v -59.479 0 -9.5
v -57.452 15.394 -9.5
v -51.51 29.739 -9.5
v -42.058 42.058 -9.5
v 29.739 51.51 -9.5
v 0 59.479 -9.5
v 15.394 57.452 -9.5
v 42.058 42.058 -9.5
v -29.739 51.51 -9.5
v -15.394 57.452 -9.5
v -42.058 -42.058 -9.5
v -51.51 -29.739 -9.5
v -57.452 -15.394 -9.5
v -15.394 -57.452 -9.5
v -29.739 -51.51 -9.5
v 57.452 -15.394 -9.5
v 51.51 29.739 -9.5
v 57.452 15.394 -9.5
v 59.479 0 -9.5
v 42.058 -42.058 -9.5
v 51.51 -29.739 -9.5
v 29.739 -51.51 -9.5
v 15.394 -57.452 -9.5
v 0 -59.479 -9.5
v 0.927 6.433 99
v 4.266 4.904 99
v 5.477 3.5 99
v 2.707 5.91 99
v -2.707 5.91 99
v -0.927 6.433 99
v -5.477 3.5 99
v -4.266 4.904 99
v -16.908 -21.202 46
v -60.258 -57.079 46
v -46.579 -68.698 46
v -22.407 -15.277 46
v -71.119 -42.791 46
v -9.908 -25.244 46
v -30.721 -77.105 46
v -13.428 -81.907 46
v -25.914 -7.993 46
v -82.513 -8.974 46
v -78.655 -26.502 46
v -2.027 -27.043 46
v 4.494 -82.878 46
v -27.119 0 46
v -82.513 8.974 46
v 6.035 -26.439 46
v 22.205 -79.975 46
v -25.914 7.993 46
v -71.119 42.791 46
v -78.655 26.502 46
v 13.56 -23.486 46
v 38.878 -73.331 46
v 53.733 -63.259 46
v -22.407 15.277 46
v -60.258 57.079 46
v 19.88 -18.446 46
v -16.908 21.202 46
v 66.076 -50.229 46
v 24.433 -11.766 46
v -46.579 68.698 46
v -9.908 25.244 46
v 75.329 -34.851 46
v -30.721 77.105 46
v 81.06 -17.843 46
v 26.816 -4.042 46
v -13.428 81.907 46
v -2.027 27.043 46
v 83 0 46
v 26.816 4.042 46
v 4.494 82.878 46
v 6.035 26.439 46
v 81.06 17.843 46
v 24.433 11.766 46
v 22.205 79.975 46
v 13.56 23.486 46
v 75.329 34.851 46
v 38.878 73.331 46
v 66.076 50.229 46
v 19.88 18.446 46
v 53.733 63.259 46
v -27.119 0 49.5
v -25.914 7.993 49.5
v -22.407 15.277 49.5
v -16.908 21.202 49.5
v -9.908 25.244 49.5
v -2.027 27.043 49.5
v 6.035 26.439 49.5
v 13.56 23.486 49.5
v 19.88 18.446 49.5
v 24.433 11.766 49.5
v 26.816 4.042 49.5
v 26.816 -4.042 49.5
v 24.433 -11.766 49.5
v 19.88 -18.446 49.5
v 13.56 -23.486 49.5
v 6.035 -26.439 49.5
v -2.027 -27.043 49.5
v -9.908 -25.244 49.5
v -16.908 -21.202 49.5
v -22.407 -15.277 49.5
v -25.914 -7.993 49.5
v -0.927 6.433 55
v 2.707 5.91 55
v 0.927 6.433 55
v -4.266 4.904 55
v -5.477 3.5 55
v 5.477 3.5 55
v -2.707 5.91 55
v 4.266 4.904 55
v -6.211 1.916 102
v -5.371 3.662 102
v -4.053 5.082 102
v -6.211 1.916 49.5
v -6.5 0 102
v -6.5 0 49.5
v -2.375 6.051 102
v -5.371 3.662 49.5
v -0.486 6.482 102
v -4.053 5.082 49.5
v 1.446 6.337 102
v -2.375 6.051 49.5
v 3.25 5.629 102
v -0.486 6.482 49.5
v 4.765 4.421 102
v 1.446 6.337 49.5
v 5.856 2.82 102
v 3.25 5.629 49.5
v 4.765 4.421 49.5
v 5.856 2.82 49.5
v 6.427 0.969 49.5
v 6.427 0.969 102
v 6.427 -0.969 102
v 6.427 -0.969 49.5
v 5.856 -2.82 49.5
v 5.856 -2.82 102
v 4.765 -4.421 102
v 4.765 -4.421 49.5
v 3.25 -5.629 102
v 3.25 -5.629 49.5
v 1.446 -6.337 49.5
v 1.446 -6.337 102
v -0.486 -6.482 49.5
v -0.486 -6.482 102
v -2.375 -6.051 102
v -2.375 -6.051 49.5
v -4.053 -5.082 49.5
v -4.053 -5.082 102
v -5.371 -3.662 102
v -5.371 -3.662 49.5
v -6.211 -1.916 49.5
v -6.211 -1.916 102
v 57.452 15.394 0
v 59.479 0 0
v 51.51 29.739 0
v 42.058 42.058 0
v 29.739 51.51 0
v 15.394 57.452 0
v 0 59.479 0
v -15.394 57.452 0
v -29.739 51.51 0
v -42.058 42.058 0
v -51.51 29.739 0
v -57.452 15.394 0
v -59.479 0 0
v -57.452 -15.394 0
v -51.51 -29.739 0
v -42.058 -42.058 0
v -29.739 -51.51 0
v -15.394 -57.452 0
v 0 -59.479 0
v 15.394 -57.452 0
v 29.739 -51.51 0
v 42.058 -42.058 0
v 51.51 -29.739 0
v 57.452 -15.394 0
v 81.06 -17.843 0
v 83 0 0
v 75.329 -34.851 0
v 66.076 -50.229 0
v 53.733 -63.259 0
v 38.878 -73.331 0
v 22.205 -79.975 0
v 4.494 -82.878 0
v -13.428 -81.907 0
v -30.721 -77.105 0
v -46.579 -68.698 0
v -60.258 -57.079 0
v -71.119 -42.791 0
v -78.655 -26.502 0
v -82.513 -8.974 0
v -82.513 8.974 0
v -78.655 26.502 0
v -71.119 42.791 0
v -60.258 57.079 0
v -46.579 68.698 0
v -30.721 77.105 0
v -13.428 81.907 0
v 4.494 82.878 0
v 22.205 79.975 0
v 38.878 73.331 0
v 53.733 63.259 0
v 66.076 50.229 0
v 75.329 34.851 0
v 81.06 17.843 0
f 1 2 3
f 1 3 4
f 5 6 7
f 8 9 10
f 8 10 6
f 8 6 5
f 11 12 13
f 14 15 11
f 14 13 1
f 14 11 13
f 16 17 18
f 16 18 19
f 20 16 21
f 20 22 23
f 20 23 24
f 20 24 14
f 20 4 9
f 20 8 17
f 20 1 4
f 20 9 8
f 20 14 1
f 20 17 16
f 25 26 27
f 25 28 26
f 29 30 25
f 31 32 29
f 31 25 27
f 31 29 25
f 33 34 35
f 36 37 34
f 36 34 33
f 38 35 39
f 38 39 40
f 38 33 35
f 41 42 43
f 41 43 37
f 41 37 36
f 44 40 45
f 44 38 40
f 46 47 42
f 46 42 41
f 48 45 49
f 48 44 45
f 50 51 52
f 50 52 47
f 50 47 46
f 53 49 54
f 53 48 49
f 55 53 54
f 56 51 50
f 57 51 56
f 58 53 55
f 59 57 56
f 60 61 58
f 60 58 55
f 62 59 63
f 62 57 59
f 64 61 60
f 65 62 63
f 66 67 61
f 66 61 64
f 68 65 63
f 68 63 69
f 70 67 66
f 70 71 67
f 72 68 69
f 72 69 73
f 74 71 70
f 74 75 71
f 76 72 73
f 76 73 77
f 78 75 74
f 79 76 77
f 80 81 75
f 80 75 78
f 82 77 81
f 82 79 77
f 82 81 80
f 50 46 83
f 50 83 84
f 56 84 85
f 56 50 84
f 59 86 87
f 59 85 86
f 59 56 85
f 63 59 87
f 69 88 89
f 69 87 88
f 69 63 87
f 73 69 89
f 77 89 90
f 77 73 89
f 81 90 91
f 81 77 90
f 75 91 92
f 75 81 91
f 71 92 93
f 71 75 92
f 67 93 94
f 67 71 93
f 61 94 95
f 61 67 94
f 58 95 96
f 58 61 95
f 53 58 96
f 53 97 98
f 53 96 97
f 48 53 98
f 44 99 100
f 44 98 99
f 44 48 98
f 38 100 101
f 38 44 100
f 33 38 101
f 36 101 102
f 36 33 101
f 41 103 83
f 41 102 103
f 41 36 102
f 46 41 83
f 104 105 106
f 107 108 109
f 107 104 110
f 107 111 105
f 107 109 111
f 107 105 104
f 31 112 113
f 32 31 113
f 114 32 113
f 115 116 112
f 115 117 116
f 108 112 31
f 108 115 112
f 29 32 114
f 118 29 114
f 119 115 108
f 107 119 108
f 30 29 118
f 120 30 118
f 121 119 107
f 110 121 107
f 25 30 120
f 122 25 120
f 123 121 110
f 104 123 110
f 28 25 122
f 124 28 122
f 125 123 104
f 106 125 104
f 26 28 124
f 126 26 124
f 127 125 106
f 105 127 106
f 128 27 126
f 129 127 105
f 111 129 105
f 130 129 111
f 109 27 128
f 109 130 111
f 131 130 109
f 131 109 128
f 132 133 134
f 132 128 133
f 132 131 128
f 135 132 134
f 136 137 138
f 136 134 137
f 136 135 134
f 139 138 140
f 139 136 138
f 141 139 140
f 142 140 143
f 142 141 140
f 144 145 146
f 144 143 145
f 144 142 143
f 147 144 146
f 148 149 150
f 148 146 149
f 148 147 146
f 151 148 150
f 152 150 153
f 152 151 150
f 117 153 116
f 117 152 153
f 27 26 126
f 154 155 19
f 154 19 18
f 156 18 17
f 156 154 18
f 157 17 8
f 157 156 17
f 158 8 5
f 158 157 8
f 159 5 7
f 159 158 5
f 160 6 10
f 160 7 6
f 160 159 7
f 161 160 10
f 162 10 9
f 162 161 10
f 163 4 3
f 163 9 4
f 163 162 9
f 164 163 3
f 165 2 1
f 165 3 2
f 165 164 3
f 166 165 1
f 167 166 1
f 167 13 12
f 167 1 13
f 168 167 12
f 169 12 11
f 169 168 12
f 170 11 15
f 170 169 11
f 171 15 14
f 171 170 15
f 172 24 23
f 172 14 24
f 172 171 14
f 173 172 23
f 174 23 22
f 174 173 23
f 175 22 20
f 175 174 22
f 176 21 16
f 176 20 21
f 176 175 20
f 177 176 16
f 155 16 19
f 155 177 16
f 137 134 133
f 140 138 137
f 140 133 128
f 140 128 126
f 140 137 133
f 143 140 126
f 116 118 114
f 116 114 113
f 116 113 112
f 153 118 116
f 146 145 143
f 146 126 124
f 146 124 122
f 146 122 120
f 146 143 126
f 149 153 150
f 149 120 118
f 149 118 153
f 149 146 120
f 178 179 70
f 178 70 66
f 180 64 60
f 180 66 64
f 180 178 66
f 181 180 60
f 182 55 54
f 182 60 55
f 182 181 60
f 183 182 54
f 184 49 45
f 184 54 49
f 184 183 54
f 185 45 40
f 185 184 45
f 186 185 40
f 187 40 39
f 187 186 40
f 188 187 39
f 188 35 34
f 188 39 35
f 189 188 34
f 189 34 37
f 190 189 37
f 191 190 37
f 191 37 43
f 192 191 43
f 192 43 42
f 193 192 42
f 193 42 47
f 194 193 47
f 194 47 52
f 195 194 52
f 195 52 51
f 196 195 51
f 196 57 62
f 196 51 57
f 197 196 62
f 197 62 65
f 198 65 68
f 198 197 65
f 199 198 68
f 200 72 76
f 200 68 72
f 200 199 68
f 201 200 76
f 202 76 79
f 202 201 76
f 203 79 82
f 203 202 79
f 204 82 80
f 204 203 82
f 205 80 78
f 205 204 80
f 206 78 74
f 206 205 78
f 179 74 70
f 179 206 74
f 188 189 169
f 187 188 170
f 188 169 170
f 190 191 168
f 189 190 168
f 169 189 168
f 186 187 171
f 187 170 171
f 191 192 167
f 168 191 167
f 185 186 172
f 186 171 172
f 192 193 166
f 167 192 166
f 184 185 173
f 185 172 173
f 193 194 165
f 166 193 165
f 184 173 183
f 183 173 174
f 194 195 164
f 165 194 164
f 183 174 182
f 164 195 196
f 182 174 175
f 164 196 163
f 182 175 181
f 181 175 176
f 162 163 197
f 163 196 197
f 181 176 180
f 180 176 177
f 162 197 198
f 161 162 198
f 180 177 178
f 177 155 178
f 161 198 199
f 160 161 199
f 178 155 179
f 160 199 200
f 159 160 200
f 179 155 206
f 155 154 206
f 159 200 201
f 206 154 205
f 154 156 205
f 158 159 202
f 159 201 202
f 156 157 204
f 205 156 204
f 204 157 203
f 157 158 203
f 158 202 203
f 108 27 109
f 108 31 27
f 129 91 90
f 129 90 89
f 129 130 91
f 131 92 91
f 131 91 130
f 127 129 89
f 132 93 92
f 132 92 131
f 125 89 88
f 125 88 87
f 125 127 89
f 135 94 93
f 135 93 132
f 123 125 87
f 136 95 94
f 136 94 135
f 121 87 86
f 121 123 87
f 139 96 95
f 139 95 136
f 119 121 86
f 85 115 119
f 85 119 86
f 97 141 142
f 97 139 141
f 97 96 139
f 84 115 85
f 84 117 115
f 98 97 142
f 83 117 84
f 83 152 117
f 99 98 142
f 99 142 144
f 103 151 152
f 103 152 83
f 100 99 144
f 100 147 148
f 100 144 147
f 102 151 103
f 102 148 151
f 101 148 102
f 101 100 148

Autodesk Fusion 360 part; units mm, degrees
sketch "スケッチ1" plane through (0, 0, 0) normal (0, 0, 1) x (1, 0, 0)
  circle A0 centre (0, 0) radius 83
  dimension "d1" = 166
extrude "押し出し1" add sketch "スケッチ1" along normal blind 46
sketch "スケッチ2" plane through (0, 0, 46) normal (0, 0, 1) x (-1, 0, 0)
  circle A0 centre (0, 0) radius 83
  circle A1 centre (0, 0) radius 27.119
extrude "押し出し2" add sketch "スケッチ2" along normal blind 3.5 contours A1
sketch "スケッチ3" plane through (0, 0, 49.5) normal (0, 0, 1) x (-1, 0, 0)
  circle A0 centre (0, 0) radius 27.119
  circle A1 centre (0, 0) radius 6.5
  dimension "d6" = 13
extrude "押し出し3" add sketch "スケッチ3" along normal blind 52.5 contours A1
sketch "スケッチ4" plane through (0, 0, 0) normal (1, 0, 0) x (0, 1, 0)
  line L0 (6.5, 102) -> (-6.5, 102)
  line L1 (-6.5, 49.5) -> (6.5, 49.5)
  line L2 (6.5, 102) -> (6.5, 99)
  line L3 (6.5, 99) -> (3.5, 99)
  line L4 (3.5, 99) -> (3.5, 55)
  line L5 (3.5, 55) -> (6.5, 55)
  line L6 (6.5, 55) -> (6.5, 99)
  dimension "d9" = 3
  dimension "d10" = 44
  dimension "d11" = 3
extrude "押し出し4" cut sketch "スケッチ4" along normal blind 52.5 and the other way blind 60
sketch "スケッチ5" plane through (0, 0, 0) normal (0, 0, -1) x (1, 0, 0)
  circle A0 centre (0, 0) radius 83
  circle A1 centre (0, 0) radius 59.4788
extrude "押し出し5" add sketch "スケッチ5" along normal blind 9.5 contours A1
